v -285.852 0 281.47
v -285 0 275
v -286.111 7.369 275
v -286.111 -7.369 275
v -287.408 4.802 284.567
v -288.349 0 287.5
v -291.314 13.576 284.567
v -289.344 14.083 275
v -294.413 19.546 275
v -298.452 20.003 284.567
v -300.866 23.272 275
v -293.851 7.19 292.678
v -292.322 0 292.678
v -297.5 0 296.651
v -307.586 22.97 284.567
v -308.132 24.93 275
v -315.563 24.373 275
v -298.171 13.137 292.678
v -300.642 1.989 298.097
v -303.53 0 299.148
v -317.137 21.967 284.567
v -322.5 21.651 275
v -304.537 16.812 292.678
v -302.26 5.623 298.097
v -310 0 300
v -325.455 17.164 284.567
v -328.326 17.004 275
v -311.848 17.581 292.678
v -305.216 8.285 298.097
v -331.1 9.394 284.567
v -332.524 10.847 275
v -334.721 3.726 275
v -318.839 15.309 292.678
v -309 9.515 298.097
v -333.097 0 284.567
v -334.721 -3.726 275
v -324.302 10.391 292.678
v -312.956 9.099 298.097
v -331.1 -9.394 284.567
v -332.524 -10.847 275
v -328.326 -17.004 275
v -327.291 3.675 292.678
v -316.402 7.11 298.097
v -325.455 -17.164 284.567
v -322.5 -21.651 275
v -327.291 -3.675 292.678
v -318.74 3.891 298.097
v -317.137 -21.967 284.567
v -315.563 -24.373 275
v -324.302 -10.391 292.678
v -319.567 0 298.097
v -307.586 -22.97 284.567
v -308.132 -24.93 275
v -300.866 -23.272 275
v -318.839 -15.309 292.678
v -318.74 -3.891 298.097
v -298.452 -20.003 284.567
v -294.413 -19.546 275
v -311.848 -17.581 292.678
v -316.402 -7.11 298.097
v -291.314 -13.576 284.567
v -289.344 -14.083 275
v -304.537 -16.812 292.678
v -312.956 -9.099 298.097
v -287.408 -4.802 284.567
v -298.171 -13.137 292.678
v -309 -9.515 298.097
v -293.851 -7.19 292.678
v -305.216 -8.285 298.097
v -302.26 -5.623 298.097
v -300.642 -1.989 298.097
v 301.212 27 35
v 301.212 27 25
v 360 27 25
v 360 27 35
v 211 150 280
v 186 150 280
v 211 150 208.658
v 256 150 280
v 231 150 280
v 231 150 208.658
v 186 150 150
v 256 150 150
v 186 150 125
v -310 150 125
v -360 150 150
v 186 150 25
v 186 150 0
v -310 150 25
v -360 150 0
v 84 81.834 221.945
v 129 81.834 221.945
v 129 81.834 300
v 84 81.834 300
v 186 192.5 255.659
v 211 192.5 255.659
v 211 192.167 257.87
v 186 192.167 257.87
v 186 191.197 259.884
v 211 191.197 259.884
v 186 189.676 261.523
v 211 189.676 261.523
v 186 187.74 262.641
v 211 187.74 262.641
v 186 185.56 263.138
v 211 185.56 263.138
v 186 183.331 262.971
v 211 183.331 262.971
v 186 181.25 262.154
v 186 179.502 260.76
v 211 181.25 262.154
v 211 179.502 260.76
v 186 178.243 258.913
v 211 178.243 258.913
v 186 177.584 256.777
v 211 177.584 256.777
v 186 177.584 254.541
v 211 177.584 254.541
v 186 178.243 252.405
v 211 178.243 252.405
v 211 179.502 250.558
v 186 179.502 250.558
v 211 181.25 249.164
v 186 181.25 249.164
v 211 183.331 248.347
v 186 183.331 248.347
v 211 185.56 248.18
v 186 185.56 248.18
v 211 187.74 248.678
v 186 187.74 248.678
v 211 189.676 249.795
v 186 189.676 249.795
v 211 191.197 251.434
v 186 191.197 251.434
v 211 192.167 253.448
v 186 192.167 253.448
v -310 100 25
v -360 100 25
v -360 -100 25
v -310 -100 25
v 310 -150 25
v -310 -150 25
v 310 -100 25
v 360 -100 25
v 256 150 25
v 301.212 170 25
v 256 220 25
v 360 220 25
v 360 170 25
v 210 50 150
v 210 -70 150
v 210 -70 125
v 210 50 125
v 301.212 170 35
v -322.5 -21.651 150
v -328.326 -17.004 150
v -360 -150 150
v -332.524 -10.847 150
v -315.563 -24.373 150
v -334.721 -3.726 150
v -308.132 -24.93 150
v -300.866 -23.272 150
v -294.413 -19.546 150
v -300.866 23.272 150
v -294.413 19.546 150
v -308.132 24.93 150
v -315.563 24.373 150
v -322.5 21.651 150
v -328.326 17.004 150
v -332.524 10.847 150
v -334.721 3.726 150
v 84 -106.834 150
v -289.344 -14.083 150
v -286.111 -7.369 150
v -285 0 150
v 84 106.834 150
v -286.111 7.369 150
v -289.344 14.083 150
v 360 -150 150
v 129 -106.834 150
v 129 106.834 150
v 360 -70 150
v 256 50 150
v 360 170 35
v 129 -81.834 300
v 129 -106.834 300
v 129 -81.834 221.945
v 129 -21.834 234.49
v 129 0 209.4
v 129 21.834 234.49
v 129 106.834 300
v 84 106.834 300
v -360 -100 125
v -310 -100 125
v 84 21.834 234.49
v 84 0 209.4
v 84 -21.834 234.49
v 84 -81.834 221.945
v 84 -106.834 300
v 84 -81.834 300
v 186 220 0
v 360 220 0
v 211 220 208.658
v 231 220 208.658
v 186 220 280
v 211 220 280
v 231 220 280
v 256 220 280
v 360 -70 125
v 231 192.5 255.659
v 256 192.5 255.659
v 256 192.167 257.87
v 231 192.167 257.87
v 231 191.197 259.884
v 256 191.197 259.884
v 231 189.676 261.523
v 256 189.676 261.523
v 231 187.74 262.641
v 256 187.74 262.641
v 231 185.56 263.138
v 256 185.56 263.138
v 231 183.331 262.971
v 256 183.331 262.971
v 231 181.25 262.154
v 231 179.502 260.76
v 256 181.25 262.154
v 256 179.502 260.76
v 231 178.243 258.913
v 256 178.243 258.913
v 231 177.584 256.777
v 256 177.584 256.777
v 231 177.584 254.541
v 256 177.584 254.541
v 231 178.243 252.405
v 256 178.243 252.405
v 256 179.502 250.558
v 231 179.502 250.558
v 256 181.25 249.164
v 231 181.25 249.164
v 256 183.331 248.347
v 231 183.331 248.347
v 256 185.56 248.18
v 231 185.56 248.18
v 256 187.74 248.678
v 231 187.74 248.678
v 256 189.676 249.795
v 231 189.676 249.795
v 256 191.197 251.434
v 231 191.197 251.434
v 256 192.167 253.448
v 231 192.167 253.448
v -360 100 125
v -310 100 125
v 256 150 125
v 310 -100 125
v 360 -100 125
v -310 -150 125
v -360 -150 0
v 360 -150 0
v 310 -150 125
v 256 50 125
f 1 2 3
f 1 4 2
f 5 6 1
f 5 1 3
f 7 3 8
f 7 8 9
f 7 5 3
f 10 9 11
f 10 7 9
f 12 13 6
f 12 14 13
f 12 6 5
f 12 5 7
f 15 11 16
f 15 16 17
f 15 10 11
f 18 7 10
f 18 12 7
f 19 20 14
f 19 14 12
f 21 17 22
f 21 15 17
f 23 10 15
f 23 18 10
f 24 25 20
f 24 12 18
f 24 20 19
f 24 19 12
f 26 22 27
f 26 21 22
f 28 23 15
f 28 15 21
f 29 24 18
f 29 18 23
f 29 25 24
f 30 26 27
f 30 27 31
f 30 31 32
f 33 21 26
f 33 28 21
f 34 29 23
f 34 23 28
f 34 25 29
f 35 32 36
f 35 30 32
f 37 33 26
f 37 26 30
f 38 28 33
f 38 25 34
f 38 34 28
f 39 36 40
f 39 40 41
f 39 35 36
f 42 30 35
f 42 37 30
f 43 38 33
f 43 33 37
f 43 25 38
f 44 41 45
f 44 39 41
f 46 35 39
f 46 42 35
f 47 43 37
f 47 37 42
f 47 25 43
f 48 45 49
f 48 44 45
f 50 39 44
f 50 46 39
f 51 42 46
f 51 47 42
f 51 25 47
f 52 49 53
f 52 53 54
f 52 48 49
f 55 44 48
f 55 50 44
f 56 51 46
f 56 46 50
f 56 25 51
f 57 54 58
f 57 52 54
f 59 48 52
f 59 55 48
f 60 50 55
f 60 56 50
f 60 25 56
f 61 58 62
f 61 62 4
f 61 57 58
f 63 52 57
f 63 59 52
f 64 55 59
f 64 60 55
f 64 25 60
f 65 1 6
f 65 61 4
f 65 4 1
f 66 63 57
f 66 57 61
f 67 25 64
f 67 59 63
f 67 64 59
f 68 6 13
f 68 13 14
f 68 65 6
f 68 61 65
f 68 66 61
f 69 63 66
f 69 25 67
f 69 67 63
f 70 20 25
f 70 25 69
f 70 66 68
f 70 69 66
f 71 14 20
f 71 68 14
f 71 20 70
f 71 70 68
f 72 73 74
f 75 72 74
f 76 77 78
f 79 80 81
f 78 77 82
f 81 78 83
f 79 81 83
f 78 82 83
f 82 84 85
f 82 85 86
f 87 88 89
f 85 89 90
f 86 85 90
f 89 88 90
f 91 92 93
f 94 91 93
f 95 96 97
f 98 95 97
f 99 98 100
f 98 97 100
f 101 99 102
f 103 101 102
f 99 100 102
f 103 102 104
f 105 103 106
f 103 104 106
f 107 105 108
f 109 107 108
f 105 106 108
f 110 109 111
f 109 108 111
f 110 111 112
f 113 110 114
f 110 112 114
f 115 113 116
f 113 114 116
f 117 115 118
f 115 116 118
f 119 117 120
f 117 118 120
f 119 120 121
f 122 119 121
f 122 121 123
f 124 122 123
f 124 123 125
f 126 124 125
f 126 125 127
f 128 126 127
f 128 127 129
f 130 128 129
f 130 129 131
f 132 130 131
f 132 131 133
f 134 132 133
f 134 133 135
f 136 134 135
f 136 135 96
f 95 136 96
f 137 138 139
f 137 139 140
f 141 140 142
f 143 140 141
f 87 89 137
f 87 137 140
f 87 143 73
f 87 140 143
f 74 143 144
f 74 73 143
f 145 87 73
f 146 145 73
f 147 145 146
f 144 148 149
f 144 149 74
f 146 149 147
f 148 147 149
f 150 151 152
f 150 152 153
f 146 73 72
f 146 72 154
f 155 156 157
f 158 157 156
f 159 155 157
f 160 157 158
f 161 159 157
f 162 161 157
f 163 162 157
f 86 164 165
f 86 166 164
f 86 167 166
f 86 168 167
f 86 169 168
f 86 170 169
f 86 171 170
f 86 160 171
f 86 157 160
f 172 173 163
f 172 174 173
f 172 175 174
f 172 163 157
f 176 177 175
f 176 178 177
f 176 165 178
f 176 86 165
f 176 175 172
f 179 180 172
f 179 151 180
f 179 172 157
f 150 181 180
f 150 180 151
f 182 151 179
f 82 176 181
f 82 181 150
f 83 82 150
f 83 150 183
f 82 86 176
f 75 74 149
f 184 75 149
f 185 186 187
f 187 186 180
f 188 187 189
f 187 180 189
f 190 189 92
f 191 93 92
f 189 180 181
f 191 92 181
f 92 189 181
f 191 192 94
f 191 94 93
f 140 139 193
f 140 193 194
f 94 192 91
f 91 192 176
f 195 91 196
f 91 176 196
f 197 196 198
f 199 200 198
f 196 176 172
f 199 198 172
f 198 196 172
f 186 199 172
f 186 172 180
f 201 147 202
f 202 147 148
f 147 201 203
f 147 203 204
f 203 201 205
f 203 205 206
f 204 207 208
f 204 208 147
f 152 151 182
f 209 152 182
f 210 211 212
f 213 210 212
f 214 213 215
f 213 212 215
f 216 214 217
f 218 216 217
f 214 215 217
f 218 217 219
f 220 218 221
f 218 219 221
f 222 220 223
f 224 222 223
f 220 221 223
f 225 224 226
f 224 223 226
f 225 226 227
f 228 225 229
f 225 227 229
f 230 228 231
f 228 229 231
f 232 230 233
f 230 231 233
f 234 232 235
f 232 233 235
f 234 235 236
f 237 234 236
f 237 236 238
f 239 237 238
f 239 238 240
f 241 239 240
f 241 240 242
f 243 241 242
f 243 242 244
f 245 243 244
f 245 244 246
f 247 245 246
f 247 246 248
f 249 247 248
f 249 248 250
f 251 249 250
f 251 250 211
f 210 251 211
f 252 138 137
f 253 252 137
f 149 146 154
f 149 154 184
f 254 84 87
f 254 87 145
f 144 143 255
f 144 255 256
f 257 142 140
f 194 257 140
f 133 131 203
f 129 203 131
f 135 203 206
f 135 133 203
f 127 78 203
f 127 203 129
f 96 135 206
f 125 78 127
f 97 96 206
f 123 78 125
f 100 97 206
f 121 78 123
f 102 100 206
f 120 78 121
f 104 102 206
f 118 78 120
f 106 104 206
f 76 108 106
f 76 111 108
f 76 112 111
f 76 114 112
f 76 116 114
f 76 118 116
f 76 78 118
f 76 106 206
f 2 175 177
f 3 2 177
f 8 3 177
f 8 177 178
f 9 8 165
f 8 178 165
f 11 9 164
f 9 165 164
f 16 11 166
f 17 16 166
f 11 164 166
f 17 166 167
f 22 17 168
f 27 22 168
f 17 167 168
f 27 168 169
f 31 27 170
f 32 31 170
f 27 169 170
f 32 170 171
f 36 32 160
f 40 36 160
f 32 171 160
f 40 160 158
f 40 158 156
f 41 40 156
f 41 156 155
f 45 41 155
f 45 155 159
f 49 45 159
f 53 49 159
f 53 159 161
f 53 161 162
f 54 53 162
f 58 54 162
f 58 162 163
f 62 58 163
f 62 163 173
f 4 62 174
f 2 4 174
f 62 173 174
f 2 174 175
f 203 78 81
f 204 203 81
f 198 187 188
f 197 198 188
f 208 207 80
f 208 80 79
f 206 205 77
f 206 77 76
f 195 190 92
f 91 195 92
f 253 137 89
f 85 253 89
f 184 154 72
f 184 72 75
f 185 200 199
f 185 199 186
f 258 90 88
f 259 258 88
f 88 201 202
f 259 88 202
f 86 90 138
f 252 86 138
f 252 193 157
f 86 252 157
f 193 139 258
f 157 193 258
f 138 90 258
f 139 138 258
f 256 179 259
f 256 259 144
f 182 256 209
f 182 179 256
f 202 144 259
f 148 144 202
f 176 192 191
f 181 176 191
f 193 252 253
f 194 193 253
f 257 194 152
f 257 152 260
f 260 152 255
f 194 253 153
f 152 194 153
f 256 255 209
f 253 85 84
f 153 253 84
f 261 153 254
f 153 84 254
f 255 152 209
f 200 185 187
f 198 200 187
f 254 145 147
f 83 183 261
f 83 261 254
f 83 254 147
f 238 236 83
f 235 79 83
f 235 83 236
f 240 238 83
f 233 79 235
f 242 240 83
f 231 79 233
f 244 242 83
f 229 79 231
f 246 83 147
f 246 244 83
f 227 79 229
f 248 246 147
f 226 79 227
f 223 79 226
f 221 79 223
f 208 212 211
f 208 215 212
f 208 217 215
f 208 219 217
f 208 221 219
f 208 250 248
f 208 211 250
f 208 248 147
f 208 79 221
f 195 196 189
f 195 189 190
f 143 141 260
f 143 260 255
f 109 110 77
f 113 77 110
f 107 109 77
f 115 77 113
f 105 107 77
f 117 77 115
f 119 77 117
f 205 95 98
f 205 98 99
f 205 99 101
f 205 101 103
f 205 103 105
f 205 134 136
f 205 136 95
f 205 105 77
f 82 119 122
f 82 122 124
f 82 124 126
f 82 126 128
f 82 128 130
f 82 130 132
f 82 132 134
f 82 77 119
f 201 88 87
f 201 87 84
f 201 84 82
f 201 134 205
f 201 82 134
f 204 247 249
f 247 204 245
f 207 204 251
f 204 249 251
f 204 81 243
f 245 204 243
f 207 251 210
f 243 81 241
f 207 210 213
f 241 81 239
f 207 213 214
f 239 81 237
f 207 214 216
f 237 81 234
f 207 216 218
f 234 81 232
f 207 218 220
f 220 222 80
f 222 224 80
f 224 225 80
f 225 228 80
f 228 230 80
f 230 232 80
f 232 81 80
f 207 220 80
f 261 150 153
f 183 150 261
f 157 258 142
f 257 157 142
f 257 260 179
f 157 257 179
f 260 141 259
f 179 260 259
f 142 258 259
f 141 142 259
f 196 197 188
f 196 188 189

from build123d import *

# Parameters (mm, degrees)
F0_W      = 720
F0_H      = 300
F1_DEPTH  = 25
F2_W      = 50
F2_H      = 50
F3_DEPTH  = 100
F4_W      = 50
F4_H      = 50
F5_DEPTH  = 100
F6_W      = 50
F6_H      = 50
F7_DEPTH  = 25
F8_R      = 25
F9_DEPTH  = 150
F10_W     = 45
F10_H     = 106.833779
F11_DEPTH = 150
F13_DEPTH = 50
F14_W     = 70
F14_H     = 70
F15_DEPTH = 150
F16_DEPTH = 130
F17_R     = 25
F18_W     = 150
F18_H     = 120
F19_DEPTH = 25
F20_W     = 104
F20_H     = 100
F21_DEPTH = 150
F22_W     = 104
F22_H     = 170
F23_DEPTH = 25
F24_W     = 20
F24_H     = 71.34236
F25_DEPTH = 80
F26_R     = 7.5
F27_DEPTH = 616.001
F28_W     = 58.787813
F28_H     = 143
F29_DEPTH = 10


with BuildPart() as f1:
    # F0 (on Top) → F1 (new body)
    with BuildSketch(Plane.XY):
        Rectangle(F0_W, F0_H)
    extrude(amount=F1_DEPTH)

    # F2 (on face) → F3 (join)
    with BuildSketch(Plane.XY.offset(25)):
        with Locations((-335, -125)):
            Rectangle(F2_W, F2_H)
    extrude(amount=F3_DEPTH)

    # F4 (on face) → F5 (join)
    with BuildSketch(Plane.XY.offset(25)):
        with Locations((335, -125)):
            Rectangle(F4_W, F4_H)
        with Locations((-335, 125)):
            Rectangle(F4_W, F4_H)
        with Locations((335, 125)):
            Rectangle(F4_W, F4_H)
    extrude(amount=F5_DEPTH)

    # F6 (on face) → F7 (join)
    with BuildSketch(Plane.XY.offset(125)):
        with Locations((-335, 125)):
            Rectangle(F6_W, F6_H)
        Polygon((360, 150), (-310, 150), (-310, 100), (-360, 100), (-360, -150), (360, -150), align=None)
    extrude(amount=F7_DEPTH)

    # F8 (on face) → F9 (join)
    with BuildSketch(Plane.XY.offset(150)):
        with Locations((-310, 0)):
            Circle(F8_R)
    extrude(amount=F9_DEPTH)

    # F10 (on face) → F11 (join)
    with BuildSketch(Plane.XY.offset(150)):
        with Locations((106.5, -53.416889)):
            Rectangle(F10_W, F10_H)
        with Locations((106.5, 53.416889)):
            Rectangle(F10_W, F10_H)
    extrude(amount=F11_DEPTH)

    # F12 (on face) → F13 (cut)
    with BuildSketch(Plane.YZ.offset(129)):
        Polygon((81.833779, 300), (-81.833779, 300), (-81.833779, 221.944749), (-21.833779, 234.489977), (0, 209.399506), (21.833779, 234.489977), (81.833779, 221.944749), align=None)
    extrude(amount=-F13_DEPTH, mode=Mode.SUBTRACT)

    # F14 (on face) → F15 (join)
    with BuildSketch(Plane.XY.offset(150)):
        with Locations((221, 185)):
            Rectangle(F14_W, F14_H)
    extrude(amount=-F15_DEPTH)

    # F14 (on face) → F16 (join)
    with BuildSketch(Plane.XY.offset(150)):
        with Locations((221, 185)):
            Rectangle(F14_W, F14_H)
    extrude(amount=F16_DEPTH)

    # F17
    f17_edges = [f1.edges().sort_by_distance(p)[0] for p in [
        (-335, 0, 300),
    ]]
    fillet(f17_edges, radius=F17_R)

    # F18 (on face) → F19 (cut)
    with BuildSketch(Plane.XY.offset(150)):
        with Locations((285, -10)):
            Rectangle(F18_W, F18_H)
    extrude(amount=-F19_DEPTH, mode=Mode.SUBTRACT)

    # F20 (on face) → F21 (cut)
    with BuildSketch(Plane.XY.offset(150)):
        with Locations((308, 100)):
            Rectangle(F20_W, F20_H)
    extrude(amount=-F21_DEPTH, mode=Mode.SUBTRACT)

    # F22 (on face) → F23 (join)
    with BuildSketch(Plane.XY.offset(25)):
        with Locations((308, 135)):
            Rectangle(F22_W, F22_H)
    extrude(amount=-F23_DEPTH)

    # F24 (on face) → F25 (cut)
    with BuildSketch(Plane.XZ.offset(-150)):
        with Locations((221, 244.32882)):
            Rectangle(F24_W, F24_H)
    extrude(amount=-F25_DEPTH, mode=Mode.SUBTRACT)

    # F26 (on face) → F27 (cut, through all)
    with BuildSketch(Plane.YZ.offset(256)):
        with Locations((185, 255.659133)):
            Circle(F26_R)
    extrude(amount=-F27_DEPTH, mode=Mode.SUBTRACT)

    # F28 (on face) → F29 (join)
    with BuildSketch(Plane.XY.offset(25)):
        with Locations((330.606093, 98.5)):
            Rectangle(F28_W, F28_H)
    extrude(amount=F29_DEPTH)


solid = f1.part
